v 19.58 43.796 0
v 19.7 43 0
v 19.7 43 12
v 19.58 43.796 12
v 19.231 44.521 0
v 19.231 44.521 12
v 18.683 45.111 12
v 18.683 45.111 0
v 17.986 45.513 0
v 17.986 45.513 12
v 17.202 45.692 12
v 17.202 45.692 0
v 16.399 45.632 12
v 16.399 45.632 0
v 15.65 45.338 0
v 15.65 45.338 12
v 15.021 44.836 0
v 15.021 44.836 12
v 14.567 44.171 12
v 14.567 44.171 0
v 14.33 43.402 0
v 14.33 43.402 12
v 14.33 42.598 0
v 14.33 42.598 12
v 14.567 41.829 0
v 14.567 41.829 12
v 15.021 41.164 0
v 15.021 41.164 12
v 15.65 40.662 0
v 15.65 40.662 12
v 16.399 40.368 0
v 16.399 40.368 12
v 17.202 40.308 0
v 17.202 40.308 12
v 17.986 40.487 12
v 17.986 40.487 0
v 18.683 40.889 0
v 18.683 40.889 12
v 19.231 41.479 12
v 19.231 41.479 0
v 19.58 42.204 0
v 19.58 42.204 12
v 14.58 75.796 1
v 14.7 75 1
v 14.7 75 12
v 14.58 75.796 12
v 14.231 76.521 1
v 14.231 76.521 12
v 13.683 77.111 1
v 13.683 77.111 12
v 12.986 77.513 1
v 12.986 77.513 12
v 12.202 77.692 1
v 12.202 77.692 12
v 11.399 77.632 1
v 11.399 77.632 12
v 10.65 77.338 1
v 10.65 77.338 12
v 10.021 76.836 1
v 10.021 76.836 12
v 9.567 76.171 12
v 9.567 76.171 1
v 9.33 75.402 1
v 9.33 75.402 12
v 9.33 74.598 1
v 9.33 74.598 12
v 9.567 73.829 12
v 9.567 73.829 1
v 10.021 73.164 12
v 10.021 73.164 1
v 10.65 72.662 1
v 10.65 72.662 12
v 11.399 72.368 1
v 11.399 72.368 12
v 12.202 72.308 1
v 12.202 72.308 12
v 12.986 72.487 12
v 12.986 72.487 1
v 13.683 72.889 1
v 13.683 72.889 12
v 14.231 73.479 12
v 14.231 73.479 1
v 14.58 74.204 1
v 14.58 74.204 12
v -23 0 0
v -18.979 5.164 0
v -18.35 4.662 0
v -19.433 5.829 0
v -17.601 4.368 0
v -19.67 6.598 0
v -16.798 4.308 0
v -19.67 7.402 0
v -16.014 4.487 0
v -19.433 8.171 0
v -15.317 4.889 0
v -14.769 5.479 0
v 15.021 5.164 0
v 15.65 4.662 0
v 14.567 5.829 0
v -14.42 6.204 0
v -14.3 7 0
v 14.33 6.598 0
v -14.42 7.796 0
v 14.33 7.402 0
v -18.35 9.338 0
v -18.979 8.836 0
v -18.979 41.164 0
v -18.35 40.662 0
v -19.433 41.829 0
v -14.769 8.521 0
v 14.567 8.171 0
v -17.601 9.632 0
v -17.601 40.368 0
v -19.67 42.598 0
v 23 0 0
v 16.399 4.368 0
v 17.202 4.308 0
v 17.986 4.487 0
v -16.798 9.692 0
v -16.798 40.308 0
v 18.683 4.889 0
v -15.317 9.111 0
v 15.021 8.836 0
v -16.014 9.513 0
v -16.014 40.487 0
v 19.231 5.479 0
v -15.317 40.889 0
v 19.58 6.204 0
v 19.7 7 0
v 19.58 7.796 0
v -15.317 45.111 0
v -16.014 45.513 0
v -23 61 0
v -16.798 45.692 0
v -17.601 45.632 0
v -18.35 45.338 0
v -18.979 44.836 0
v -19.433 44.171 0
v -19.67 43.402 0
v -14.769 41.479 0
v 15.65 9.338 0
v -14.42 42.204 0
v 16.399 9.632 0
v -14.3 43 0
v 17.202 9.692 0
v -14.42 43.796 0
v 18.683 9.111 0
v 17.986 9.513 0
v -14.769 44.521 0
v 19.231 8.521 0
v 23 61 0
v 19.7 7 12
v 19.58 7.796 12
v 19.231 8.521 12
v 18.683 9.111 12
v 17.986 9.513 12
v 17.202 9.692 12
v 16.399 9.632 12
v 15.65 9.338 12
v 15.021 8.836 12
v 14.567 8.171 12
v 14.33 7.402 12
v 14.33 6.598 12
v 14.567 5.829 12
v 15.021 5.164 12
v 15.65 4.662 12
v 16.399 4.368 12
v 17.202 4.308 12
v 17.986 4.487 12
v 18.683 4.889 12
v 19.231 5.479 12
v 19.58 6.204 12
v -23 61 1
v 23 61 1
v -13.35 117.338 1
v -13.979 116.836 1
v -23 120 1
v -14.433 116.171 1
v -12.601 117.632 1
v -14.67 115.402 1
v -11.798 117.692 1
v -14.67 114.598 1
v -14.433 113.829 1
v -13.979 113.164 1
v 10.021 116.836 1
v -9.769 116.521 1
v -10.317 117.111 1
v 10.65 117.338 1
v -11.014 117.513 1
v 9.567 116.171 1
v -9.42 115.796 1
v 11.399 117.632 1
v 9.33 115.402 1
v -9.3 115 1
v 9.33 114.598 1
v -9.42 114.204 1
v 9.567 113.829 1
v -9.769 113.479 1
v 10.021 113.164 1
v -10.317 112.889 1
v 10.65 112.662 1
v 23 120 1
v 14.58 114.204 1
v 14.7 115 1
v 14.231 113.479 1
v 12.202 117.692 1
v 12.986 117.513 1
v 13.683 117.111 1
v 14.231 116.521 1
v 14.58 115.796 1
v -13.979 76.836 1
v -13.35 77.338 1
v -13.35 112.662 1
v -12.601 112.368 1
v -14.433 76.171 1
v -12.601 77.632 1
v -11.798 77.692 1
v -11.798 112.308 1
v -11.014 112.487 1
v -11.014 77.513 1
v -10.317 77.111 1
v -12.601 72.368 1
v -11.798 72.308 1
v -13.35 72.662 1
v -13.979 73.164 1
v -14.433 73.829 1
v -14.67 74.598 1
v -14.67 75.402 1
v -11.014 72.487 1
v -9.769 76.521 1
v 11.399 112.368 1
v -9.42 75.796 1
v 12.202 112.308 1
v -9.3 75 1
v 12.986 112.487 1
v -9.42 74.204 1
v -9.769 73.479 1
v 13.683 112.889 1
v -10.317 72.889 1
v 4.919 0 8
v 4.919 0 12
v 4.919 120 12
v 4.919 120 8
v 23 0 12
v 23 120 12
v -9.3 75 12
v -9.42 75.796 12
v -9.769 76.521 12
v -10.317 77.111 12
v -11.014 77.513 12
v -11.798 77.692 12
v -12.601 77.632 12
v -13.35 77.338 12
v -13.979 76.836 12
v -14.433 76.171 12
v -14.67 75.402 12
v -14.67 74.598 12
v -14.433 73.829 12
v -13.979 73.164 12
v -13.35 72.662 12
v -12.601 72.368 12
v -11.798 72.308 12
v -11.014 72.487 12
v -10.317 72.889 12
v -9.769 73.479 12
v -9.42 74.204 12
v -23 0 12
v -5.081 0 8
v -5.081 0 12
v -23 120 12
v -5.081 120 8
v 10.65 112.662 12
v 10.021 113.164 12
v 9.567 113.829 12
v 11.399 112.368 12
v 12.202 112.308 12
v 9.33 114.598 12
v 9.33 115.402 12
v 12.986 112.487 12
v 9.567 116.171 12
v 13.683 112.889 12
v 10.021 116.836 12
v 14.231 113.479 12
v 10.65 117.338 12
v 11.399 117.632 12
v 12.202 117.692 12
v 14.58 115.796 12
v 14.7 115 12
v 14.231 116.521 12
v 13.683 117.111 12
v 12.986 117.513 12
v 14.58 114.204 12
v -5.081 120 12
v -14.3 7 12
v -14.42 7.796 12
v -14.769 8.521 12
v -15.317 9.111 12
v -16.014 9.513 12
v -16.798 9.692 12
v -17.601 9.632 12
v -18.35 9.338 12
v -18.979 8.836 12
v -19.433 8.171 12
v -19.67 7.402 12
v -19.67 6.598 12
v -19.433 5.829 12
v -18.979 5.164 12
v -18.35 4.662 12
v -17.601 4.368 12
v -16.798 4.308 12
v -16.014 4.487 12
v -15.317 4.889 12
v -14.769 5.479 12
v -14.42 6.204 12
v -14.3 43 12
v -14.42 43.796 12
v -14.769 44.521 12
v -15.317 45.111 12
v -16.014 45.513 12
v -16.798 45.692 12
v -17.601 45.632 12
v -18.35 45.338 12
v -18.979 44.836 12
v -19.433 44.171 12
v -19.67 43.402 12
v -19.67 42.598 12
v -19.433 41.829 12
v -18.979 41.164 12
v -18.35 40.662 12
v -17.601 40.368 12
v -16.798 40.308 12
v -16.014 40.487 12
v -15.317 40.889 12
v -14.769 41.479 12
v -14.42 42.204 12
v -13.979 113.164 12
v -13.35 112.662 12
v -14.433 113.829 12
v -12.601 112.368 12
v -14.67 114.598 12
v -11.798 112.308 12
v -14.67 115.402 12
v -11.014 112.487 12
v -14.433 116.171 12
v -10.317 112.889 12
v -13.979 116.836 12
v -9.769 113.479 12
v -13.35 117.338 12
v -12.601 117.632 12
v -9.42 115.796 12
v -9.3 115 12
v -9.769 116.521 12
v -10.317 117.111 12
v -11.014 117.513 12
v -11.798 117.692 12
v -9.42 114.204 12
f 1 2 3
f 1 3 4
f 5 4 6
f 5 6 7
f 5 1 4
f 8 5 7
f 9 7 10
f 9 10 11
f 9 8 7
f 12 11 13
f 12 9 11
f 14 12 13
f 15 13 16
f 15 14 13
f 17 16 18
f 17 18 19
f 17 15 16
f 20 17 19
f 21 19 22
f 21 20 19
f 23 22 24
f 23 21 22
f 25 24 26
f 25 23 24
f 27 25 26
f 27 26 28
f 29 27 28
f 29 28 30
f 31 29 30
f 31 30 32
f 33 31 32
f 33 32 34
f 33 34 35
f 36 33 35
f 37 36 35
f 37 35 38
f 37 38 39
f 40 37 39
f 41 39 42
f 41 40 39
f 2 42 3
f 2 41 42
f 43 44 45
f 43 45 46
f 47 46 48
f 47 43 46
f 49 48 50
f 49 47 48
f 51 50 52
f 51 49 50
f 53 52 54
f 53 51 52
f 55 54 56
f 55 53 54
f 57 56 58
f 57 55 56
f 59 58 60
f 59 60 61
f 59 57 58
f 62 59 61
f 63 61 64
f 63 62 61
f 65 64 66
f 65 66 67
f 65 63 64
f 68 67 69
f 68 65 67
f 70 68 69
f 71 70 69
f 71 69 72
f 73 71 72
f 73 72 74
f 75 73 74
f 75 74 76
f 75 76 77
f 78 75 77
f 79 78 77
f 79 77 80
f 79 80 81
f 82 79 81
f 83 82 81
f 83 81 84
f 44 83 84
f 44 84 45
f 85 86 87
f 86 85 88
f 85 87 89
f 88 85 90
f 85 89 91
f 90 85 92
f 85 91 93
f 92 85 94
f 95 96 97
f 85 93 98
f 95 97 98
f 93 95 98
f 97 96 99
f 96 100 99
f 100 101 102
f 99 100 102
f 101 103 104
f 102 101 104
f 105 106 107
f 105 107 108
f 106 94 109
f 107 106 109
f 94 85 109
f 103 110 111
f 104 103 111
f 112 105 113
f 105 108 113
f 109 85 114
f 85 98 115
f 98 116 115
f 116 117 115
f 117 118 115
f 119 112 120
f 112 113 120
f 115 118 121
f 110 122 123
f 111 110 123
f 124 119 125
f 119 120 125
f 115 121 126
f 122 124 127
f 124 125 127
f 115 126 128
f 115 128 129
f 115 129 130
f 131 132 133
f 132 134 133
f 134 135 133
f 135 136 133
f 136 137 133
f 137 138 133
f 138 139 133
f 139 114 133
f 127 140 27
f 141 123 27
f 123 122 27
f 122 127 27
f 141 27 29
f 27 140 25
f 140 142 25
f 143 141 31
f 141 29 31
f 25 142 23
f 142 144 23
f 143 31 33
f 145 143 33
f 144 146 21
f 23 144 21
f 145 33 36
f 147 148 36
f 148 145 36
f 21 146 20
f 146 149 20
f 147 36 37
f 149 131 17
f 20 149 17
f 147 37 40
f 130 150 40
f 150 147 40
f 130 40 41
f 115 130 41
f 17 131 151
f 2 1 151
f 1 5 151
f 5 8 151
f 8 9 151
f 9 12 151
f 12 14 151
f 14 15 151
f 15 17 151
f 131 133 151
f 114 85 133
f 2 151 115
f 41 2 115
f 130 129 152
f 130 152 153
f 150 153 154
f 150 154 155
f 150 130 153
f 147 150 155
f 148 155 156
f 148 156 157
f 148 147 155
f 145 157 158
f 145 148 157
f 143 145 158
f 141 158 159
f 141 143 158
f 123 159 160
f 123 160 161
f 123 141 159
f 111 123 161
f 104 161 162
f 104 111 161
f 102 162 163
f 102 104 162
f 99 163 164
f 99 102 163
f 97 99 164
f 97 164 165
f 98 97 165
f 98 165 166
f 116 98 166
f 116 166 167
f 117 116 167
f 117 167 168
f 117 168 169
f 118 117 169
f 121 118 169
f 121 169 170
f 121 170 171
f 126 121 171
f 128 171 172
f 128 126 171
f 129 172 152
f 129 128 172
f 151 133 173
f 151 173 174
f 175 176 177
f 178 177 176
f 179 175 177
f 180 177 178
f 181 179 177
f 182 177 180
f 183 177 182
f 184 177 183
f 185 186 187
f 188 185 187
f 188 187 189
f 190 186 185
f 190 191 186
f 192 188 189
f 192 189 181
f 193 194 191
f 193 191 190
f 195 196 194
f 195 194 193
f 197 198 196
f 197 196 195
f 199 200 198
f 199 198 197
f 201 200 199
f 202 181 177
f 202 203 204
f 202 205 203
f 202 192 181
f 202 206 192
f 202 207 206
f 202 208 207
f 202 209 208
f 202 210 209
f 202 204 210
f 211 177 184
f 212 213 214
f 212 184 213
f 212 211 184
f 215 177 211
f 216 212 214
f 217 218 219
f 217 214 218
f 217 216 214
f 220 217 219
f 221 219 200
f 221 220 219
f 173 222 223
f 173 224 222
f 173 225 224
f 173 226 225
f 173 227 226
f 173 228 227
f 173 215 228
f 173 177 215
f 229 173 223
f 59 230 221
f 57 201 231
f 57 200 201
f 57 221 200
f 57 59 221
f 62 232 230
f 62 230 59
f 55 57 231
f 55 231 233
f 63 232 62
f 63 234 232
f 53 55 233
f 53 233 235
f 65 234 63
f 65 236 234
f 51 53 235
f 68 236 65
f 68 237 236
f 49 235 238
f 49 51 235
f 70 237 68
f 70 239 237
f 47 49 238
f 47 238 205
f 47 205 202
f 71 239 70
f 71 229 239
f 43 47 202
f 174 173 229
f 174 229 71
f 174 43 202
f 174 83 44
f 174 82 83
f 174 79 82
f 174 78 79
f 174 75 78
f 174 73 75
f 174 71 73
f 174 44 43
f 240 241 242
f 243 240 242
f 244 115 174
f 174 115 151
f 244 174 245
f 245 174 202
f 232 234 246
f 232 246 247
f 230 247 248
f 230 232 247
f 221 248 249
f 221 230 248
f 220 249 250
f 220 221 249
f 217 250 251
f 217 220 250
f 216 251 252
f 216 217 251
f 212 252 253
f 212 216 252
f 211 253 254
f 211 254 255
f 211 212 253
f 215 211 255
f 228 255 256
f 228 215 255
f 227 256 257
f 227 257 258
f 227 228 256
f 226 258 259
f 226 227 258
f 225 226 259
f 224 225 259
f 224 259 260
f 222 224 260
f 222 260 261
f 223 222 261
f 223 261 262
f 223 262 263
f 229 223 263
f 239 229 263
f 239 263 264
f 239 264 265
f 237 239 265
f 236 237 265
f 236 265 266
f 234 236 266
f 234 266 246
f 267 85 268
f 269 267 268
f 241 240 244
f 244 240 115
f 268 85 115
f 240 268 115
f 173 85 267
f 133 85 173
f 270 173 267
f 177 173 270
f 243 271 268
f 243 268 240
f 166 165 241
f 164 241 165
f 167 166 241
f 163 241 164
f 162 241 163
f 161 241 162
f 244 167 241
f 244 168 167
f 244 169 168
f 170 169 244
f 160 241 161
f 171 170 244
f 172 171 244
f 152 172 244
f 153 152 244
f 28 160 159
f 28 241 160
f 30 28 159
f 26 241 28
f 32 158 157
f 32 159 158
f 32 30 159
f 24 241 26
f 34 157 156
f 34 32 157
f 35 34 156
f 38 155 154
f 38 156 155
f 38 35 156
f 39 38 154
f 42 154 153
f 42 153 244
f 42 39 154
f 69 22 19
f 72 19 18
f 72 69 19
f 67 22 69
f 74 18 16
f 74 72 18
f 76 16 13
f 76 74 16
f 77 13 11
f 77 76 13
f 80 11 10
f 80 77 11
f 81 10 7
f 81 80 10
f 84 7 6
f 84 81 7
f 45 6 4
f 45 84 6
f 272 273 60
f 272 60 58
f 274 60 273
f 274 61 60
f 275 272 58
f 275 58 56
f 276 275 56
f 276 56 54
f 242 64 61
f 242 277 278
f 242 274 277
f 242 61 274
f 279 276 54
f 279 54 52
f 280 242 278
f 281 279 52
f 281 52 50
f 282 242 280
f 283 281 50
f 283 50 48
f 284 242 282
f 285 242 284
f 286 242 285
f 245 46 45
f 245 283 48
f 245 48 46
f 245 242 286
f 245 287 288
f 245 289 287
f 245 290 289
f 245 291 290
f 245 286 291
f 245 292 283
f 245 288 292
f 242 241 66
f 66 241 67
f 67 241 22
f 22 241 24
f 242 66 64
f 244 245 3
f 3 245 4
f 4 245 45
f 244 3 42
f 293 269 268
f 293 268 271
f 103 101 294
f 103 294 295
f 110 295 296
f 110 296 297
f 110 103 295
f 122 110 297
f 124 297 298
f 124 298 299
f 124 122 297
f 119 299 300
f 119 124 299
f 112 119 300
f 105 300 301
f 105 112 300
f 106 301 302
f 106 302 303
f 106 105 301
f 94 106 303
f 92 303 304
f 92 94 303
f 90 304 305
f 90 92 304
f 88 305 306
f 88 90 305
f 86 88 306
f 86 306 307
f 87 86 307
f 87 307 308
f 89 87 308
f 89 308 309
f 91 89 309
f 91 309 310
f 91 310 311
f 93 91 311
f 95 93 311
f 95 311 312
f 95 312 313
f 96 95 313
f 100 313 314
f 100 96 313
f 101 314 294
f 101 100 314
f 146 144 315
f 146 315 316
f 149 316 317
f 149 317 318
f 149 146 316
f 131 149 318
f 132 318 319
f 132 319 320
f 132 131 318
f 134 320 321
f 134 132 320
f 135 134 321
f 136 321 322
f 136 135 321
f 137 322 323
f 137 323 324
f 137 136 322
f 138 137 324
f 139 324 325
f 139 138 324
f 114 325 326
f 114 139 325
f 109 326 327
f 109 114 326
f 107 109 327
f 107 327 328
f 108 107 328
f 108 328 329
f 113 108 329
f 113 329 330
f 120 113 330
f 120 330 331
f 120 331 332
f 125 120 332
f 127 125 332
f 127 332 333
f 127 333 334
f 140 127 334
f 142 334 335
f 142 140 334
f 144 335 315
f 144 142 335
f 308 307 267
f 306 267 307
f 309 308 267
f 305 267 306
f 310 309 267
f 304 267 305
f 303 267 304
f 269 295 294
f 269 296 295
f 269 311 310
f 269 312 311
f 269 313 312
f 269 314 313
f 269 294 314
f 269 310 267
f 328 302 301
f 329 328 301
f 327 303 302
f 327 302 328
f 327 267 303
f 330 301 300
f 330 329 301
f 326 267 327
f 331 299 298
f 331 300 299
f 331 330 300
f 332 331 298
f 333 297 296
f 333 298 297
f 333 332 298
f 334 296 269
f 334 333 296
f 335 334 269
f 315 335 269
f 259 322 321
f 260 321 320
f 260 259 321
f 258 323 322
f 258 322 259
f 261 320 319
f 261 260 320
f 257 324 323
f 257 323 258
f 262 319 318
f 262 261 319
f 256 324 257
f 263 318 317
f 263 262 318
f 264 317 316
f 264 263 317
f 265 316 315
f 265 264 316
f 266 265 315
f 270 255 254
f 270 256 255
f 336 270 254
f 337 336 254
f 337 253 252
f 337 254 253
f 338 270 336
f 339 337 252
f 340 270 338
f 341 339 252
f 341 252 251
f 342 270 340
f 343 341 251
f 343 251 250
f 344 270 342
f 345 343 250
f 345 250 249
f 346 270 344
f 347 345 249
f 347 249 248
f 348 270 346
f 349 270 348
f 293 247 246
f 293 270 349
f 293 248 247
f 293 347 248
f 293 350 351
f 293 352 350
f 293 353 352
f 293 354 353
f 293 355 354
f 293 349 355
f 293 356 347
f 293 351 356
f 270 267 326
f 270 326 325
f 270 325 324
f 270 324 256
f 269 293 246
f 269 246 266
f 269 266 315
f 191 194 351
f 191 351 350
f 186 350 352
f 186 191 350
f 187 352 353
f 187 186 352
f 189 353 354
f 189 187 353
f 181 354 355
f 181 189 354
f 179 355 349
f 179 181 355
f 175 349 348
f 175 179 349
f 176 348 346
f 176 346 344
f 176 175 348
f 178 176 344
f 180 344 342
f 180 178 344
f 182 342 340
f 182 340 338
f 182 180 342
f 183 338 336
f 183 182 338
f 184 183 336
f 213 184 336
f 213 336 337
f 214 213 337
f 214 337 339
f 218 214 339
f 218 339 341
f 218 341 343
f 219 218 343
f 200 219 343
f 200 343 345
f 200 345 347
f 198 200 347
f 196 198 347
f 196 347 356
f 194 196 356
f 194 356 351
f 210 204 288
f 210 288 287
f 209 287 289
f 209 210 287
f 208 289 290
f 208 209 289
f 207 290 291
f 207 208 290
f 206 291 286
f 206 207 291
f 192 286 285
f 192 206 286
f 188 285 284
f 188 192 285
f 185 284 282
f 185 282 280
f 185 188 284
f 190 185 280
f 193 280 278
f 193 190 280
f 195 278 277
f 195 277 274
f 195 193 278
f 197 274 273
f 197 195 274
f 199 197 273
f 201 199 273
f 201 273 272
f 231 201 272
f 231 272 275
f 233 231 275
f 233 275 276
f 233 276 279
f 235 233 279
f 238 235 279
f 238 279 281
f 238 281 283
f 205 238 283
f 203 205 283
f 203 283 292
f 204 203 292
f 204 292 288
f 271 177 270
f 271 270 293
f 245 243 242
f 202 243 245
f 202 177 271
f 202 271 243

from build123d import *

# Parameters (mm, degrees)
SKETCH_W        = 46
SKETCH_H        = 120
SKETCH_R        = 2.7
PAD_DEPTH       = 12
SKETCH001_W     = 10
SKETCH001_H     = 120
POCKET_DEPTH    = 4
SKETCH002_W     = 46
SKETCH002_H     = 59
POCKET001_DEPTH = 1


with BuildPart() as part:
    # Sketch → Pad (new body)
    with BuildSketch(Plane.XY):
        with Locations((0, 60)):
            Rectangle(SKETCH_W, SKETCH_H)
        with Locations((-17, 7)):
            Circle(SKETCH_R, mode=Mode.SUBTRACT)
        with Locations((-17, 43)):
            Circle(SKETCH_R, mode=Mode.SUBTRACT)
        with Locations((17, 43)):
            Circle(SKETCH_R, mode=Mode.SUBTRACT)
        with Locations((17, 7)):
            Circle(SKETCH_R, mode=Mode.SUBTRACT)
        with Locations((-12, 115)):
            Circle(SKETCH_R, mode=Mode.SUBTRACT)
        with Locations((12, 115)):
            Circle(SKETCH_R, mode=Mode.SUBTRACT)
        with Locations((12, 75)):
            Circle(SKETCH_R, mode=Mode.SUBTRACT)
        with Locations((-12, 75)):
            Circle(SKETCH_R, mode=Mode.SUBTRACT)
    extrude(amount=PAD_DEPTH)

    # Sketch001 (on Face14 of Pad) → Pocket (cut)
    with BuildSketch(Plane.XY.offset(12)):
        with Locations((-0.080761, 60)):
            Rectangle(SKETCH001_W, SKETCH001_H)
    extrude(amount=-POCKET_DEPTH, mode=Mode.SUBTRACT)

    # Sketch002 (on Face2 of Pocket) → Pocket001 (cut)
    with BuildSketch(Plane(origin=(0, 0, 0), x_dir=(1, 0, 0), z_dir=(0, 0, -1))):
        with Locations((0, -90.5)):
            Rectangle(SKETCH002_W, SKETCH002_H)
    extrude(amount=-POCKET001_DEPTH, mode=Mode.SUBTRACT)


solid = part.part
